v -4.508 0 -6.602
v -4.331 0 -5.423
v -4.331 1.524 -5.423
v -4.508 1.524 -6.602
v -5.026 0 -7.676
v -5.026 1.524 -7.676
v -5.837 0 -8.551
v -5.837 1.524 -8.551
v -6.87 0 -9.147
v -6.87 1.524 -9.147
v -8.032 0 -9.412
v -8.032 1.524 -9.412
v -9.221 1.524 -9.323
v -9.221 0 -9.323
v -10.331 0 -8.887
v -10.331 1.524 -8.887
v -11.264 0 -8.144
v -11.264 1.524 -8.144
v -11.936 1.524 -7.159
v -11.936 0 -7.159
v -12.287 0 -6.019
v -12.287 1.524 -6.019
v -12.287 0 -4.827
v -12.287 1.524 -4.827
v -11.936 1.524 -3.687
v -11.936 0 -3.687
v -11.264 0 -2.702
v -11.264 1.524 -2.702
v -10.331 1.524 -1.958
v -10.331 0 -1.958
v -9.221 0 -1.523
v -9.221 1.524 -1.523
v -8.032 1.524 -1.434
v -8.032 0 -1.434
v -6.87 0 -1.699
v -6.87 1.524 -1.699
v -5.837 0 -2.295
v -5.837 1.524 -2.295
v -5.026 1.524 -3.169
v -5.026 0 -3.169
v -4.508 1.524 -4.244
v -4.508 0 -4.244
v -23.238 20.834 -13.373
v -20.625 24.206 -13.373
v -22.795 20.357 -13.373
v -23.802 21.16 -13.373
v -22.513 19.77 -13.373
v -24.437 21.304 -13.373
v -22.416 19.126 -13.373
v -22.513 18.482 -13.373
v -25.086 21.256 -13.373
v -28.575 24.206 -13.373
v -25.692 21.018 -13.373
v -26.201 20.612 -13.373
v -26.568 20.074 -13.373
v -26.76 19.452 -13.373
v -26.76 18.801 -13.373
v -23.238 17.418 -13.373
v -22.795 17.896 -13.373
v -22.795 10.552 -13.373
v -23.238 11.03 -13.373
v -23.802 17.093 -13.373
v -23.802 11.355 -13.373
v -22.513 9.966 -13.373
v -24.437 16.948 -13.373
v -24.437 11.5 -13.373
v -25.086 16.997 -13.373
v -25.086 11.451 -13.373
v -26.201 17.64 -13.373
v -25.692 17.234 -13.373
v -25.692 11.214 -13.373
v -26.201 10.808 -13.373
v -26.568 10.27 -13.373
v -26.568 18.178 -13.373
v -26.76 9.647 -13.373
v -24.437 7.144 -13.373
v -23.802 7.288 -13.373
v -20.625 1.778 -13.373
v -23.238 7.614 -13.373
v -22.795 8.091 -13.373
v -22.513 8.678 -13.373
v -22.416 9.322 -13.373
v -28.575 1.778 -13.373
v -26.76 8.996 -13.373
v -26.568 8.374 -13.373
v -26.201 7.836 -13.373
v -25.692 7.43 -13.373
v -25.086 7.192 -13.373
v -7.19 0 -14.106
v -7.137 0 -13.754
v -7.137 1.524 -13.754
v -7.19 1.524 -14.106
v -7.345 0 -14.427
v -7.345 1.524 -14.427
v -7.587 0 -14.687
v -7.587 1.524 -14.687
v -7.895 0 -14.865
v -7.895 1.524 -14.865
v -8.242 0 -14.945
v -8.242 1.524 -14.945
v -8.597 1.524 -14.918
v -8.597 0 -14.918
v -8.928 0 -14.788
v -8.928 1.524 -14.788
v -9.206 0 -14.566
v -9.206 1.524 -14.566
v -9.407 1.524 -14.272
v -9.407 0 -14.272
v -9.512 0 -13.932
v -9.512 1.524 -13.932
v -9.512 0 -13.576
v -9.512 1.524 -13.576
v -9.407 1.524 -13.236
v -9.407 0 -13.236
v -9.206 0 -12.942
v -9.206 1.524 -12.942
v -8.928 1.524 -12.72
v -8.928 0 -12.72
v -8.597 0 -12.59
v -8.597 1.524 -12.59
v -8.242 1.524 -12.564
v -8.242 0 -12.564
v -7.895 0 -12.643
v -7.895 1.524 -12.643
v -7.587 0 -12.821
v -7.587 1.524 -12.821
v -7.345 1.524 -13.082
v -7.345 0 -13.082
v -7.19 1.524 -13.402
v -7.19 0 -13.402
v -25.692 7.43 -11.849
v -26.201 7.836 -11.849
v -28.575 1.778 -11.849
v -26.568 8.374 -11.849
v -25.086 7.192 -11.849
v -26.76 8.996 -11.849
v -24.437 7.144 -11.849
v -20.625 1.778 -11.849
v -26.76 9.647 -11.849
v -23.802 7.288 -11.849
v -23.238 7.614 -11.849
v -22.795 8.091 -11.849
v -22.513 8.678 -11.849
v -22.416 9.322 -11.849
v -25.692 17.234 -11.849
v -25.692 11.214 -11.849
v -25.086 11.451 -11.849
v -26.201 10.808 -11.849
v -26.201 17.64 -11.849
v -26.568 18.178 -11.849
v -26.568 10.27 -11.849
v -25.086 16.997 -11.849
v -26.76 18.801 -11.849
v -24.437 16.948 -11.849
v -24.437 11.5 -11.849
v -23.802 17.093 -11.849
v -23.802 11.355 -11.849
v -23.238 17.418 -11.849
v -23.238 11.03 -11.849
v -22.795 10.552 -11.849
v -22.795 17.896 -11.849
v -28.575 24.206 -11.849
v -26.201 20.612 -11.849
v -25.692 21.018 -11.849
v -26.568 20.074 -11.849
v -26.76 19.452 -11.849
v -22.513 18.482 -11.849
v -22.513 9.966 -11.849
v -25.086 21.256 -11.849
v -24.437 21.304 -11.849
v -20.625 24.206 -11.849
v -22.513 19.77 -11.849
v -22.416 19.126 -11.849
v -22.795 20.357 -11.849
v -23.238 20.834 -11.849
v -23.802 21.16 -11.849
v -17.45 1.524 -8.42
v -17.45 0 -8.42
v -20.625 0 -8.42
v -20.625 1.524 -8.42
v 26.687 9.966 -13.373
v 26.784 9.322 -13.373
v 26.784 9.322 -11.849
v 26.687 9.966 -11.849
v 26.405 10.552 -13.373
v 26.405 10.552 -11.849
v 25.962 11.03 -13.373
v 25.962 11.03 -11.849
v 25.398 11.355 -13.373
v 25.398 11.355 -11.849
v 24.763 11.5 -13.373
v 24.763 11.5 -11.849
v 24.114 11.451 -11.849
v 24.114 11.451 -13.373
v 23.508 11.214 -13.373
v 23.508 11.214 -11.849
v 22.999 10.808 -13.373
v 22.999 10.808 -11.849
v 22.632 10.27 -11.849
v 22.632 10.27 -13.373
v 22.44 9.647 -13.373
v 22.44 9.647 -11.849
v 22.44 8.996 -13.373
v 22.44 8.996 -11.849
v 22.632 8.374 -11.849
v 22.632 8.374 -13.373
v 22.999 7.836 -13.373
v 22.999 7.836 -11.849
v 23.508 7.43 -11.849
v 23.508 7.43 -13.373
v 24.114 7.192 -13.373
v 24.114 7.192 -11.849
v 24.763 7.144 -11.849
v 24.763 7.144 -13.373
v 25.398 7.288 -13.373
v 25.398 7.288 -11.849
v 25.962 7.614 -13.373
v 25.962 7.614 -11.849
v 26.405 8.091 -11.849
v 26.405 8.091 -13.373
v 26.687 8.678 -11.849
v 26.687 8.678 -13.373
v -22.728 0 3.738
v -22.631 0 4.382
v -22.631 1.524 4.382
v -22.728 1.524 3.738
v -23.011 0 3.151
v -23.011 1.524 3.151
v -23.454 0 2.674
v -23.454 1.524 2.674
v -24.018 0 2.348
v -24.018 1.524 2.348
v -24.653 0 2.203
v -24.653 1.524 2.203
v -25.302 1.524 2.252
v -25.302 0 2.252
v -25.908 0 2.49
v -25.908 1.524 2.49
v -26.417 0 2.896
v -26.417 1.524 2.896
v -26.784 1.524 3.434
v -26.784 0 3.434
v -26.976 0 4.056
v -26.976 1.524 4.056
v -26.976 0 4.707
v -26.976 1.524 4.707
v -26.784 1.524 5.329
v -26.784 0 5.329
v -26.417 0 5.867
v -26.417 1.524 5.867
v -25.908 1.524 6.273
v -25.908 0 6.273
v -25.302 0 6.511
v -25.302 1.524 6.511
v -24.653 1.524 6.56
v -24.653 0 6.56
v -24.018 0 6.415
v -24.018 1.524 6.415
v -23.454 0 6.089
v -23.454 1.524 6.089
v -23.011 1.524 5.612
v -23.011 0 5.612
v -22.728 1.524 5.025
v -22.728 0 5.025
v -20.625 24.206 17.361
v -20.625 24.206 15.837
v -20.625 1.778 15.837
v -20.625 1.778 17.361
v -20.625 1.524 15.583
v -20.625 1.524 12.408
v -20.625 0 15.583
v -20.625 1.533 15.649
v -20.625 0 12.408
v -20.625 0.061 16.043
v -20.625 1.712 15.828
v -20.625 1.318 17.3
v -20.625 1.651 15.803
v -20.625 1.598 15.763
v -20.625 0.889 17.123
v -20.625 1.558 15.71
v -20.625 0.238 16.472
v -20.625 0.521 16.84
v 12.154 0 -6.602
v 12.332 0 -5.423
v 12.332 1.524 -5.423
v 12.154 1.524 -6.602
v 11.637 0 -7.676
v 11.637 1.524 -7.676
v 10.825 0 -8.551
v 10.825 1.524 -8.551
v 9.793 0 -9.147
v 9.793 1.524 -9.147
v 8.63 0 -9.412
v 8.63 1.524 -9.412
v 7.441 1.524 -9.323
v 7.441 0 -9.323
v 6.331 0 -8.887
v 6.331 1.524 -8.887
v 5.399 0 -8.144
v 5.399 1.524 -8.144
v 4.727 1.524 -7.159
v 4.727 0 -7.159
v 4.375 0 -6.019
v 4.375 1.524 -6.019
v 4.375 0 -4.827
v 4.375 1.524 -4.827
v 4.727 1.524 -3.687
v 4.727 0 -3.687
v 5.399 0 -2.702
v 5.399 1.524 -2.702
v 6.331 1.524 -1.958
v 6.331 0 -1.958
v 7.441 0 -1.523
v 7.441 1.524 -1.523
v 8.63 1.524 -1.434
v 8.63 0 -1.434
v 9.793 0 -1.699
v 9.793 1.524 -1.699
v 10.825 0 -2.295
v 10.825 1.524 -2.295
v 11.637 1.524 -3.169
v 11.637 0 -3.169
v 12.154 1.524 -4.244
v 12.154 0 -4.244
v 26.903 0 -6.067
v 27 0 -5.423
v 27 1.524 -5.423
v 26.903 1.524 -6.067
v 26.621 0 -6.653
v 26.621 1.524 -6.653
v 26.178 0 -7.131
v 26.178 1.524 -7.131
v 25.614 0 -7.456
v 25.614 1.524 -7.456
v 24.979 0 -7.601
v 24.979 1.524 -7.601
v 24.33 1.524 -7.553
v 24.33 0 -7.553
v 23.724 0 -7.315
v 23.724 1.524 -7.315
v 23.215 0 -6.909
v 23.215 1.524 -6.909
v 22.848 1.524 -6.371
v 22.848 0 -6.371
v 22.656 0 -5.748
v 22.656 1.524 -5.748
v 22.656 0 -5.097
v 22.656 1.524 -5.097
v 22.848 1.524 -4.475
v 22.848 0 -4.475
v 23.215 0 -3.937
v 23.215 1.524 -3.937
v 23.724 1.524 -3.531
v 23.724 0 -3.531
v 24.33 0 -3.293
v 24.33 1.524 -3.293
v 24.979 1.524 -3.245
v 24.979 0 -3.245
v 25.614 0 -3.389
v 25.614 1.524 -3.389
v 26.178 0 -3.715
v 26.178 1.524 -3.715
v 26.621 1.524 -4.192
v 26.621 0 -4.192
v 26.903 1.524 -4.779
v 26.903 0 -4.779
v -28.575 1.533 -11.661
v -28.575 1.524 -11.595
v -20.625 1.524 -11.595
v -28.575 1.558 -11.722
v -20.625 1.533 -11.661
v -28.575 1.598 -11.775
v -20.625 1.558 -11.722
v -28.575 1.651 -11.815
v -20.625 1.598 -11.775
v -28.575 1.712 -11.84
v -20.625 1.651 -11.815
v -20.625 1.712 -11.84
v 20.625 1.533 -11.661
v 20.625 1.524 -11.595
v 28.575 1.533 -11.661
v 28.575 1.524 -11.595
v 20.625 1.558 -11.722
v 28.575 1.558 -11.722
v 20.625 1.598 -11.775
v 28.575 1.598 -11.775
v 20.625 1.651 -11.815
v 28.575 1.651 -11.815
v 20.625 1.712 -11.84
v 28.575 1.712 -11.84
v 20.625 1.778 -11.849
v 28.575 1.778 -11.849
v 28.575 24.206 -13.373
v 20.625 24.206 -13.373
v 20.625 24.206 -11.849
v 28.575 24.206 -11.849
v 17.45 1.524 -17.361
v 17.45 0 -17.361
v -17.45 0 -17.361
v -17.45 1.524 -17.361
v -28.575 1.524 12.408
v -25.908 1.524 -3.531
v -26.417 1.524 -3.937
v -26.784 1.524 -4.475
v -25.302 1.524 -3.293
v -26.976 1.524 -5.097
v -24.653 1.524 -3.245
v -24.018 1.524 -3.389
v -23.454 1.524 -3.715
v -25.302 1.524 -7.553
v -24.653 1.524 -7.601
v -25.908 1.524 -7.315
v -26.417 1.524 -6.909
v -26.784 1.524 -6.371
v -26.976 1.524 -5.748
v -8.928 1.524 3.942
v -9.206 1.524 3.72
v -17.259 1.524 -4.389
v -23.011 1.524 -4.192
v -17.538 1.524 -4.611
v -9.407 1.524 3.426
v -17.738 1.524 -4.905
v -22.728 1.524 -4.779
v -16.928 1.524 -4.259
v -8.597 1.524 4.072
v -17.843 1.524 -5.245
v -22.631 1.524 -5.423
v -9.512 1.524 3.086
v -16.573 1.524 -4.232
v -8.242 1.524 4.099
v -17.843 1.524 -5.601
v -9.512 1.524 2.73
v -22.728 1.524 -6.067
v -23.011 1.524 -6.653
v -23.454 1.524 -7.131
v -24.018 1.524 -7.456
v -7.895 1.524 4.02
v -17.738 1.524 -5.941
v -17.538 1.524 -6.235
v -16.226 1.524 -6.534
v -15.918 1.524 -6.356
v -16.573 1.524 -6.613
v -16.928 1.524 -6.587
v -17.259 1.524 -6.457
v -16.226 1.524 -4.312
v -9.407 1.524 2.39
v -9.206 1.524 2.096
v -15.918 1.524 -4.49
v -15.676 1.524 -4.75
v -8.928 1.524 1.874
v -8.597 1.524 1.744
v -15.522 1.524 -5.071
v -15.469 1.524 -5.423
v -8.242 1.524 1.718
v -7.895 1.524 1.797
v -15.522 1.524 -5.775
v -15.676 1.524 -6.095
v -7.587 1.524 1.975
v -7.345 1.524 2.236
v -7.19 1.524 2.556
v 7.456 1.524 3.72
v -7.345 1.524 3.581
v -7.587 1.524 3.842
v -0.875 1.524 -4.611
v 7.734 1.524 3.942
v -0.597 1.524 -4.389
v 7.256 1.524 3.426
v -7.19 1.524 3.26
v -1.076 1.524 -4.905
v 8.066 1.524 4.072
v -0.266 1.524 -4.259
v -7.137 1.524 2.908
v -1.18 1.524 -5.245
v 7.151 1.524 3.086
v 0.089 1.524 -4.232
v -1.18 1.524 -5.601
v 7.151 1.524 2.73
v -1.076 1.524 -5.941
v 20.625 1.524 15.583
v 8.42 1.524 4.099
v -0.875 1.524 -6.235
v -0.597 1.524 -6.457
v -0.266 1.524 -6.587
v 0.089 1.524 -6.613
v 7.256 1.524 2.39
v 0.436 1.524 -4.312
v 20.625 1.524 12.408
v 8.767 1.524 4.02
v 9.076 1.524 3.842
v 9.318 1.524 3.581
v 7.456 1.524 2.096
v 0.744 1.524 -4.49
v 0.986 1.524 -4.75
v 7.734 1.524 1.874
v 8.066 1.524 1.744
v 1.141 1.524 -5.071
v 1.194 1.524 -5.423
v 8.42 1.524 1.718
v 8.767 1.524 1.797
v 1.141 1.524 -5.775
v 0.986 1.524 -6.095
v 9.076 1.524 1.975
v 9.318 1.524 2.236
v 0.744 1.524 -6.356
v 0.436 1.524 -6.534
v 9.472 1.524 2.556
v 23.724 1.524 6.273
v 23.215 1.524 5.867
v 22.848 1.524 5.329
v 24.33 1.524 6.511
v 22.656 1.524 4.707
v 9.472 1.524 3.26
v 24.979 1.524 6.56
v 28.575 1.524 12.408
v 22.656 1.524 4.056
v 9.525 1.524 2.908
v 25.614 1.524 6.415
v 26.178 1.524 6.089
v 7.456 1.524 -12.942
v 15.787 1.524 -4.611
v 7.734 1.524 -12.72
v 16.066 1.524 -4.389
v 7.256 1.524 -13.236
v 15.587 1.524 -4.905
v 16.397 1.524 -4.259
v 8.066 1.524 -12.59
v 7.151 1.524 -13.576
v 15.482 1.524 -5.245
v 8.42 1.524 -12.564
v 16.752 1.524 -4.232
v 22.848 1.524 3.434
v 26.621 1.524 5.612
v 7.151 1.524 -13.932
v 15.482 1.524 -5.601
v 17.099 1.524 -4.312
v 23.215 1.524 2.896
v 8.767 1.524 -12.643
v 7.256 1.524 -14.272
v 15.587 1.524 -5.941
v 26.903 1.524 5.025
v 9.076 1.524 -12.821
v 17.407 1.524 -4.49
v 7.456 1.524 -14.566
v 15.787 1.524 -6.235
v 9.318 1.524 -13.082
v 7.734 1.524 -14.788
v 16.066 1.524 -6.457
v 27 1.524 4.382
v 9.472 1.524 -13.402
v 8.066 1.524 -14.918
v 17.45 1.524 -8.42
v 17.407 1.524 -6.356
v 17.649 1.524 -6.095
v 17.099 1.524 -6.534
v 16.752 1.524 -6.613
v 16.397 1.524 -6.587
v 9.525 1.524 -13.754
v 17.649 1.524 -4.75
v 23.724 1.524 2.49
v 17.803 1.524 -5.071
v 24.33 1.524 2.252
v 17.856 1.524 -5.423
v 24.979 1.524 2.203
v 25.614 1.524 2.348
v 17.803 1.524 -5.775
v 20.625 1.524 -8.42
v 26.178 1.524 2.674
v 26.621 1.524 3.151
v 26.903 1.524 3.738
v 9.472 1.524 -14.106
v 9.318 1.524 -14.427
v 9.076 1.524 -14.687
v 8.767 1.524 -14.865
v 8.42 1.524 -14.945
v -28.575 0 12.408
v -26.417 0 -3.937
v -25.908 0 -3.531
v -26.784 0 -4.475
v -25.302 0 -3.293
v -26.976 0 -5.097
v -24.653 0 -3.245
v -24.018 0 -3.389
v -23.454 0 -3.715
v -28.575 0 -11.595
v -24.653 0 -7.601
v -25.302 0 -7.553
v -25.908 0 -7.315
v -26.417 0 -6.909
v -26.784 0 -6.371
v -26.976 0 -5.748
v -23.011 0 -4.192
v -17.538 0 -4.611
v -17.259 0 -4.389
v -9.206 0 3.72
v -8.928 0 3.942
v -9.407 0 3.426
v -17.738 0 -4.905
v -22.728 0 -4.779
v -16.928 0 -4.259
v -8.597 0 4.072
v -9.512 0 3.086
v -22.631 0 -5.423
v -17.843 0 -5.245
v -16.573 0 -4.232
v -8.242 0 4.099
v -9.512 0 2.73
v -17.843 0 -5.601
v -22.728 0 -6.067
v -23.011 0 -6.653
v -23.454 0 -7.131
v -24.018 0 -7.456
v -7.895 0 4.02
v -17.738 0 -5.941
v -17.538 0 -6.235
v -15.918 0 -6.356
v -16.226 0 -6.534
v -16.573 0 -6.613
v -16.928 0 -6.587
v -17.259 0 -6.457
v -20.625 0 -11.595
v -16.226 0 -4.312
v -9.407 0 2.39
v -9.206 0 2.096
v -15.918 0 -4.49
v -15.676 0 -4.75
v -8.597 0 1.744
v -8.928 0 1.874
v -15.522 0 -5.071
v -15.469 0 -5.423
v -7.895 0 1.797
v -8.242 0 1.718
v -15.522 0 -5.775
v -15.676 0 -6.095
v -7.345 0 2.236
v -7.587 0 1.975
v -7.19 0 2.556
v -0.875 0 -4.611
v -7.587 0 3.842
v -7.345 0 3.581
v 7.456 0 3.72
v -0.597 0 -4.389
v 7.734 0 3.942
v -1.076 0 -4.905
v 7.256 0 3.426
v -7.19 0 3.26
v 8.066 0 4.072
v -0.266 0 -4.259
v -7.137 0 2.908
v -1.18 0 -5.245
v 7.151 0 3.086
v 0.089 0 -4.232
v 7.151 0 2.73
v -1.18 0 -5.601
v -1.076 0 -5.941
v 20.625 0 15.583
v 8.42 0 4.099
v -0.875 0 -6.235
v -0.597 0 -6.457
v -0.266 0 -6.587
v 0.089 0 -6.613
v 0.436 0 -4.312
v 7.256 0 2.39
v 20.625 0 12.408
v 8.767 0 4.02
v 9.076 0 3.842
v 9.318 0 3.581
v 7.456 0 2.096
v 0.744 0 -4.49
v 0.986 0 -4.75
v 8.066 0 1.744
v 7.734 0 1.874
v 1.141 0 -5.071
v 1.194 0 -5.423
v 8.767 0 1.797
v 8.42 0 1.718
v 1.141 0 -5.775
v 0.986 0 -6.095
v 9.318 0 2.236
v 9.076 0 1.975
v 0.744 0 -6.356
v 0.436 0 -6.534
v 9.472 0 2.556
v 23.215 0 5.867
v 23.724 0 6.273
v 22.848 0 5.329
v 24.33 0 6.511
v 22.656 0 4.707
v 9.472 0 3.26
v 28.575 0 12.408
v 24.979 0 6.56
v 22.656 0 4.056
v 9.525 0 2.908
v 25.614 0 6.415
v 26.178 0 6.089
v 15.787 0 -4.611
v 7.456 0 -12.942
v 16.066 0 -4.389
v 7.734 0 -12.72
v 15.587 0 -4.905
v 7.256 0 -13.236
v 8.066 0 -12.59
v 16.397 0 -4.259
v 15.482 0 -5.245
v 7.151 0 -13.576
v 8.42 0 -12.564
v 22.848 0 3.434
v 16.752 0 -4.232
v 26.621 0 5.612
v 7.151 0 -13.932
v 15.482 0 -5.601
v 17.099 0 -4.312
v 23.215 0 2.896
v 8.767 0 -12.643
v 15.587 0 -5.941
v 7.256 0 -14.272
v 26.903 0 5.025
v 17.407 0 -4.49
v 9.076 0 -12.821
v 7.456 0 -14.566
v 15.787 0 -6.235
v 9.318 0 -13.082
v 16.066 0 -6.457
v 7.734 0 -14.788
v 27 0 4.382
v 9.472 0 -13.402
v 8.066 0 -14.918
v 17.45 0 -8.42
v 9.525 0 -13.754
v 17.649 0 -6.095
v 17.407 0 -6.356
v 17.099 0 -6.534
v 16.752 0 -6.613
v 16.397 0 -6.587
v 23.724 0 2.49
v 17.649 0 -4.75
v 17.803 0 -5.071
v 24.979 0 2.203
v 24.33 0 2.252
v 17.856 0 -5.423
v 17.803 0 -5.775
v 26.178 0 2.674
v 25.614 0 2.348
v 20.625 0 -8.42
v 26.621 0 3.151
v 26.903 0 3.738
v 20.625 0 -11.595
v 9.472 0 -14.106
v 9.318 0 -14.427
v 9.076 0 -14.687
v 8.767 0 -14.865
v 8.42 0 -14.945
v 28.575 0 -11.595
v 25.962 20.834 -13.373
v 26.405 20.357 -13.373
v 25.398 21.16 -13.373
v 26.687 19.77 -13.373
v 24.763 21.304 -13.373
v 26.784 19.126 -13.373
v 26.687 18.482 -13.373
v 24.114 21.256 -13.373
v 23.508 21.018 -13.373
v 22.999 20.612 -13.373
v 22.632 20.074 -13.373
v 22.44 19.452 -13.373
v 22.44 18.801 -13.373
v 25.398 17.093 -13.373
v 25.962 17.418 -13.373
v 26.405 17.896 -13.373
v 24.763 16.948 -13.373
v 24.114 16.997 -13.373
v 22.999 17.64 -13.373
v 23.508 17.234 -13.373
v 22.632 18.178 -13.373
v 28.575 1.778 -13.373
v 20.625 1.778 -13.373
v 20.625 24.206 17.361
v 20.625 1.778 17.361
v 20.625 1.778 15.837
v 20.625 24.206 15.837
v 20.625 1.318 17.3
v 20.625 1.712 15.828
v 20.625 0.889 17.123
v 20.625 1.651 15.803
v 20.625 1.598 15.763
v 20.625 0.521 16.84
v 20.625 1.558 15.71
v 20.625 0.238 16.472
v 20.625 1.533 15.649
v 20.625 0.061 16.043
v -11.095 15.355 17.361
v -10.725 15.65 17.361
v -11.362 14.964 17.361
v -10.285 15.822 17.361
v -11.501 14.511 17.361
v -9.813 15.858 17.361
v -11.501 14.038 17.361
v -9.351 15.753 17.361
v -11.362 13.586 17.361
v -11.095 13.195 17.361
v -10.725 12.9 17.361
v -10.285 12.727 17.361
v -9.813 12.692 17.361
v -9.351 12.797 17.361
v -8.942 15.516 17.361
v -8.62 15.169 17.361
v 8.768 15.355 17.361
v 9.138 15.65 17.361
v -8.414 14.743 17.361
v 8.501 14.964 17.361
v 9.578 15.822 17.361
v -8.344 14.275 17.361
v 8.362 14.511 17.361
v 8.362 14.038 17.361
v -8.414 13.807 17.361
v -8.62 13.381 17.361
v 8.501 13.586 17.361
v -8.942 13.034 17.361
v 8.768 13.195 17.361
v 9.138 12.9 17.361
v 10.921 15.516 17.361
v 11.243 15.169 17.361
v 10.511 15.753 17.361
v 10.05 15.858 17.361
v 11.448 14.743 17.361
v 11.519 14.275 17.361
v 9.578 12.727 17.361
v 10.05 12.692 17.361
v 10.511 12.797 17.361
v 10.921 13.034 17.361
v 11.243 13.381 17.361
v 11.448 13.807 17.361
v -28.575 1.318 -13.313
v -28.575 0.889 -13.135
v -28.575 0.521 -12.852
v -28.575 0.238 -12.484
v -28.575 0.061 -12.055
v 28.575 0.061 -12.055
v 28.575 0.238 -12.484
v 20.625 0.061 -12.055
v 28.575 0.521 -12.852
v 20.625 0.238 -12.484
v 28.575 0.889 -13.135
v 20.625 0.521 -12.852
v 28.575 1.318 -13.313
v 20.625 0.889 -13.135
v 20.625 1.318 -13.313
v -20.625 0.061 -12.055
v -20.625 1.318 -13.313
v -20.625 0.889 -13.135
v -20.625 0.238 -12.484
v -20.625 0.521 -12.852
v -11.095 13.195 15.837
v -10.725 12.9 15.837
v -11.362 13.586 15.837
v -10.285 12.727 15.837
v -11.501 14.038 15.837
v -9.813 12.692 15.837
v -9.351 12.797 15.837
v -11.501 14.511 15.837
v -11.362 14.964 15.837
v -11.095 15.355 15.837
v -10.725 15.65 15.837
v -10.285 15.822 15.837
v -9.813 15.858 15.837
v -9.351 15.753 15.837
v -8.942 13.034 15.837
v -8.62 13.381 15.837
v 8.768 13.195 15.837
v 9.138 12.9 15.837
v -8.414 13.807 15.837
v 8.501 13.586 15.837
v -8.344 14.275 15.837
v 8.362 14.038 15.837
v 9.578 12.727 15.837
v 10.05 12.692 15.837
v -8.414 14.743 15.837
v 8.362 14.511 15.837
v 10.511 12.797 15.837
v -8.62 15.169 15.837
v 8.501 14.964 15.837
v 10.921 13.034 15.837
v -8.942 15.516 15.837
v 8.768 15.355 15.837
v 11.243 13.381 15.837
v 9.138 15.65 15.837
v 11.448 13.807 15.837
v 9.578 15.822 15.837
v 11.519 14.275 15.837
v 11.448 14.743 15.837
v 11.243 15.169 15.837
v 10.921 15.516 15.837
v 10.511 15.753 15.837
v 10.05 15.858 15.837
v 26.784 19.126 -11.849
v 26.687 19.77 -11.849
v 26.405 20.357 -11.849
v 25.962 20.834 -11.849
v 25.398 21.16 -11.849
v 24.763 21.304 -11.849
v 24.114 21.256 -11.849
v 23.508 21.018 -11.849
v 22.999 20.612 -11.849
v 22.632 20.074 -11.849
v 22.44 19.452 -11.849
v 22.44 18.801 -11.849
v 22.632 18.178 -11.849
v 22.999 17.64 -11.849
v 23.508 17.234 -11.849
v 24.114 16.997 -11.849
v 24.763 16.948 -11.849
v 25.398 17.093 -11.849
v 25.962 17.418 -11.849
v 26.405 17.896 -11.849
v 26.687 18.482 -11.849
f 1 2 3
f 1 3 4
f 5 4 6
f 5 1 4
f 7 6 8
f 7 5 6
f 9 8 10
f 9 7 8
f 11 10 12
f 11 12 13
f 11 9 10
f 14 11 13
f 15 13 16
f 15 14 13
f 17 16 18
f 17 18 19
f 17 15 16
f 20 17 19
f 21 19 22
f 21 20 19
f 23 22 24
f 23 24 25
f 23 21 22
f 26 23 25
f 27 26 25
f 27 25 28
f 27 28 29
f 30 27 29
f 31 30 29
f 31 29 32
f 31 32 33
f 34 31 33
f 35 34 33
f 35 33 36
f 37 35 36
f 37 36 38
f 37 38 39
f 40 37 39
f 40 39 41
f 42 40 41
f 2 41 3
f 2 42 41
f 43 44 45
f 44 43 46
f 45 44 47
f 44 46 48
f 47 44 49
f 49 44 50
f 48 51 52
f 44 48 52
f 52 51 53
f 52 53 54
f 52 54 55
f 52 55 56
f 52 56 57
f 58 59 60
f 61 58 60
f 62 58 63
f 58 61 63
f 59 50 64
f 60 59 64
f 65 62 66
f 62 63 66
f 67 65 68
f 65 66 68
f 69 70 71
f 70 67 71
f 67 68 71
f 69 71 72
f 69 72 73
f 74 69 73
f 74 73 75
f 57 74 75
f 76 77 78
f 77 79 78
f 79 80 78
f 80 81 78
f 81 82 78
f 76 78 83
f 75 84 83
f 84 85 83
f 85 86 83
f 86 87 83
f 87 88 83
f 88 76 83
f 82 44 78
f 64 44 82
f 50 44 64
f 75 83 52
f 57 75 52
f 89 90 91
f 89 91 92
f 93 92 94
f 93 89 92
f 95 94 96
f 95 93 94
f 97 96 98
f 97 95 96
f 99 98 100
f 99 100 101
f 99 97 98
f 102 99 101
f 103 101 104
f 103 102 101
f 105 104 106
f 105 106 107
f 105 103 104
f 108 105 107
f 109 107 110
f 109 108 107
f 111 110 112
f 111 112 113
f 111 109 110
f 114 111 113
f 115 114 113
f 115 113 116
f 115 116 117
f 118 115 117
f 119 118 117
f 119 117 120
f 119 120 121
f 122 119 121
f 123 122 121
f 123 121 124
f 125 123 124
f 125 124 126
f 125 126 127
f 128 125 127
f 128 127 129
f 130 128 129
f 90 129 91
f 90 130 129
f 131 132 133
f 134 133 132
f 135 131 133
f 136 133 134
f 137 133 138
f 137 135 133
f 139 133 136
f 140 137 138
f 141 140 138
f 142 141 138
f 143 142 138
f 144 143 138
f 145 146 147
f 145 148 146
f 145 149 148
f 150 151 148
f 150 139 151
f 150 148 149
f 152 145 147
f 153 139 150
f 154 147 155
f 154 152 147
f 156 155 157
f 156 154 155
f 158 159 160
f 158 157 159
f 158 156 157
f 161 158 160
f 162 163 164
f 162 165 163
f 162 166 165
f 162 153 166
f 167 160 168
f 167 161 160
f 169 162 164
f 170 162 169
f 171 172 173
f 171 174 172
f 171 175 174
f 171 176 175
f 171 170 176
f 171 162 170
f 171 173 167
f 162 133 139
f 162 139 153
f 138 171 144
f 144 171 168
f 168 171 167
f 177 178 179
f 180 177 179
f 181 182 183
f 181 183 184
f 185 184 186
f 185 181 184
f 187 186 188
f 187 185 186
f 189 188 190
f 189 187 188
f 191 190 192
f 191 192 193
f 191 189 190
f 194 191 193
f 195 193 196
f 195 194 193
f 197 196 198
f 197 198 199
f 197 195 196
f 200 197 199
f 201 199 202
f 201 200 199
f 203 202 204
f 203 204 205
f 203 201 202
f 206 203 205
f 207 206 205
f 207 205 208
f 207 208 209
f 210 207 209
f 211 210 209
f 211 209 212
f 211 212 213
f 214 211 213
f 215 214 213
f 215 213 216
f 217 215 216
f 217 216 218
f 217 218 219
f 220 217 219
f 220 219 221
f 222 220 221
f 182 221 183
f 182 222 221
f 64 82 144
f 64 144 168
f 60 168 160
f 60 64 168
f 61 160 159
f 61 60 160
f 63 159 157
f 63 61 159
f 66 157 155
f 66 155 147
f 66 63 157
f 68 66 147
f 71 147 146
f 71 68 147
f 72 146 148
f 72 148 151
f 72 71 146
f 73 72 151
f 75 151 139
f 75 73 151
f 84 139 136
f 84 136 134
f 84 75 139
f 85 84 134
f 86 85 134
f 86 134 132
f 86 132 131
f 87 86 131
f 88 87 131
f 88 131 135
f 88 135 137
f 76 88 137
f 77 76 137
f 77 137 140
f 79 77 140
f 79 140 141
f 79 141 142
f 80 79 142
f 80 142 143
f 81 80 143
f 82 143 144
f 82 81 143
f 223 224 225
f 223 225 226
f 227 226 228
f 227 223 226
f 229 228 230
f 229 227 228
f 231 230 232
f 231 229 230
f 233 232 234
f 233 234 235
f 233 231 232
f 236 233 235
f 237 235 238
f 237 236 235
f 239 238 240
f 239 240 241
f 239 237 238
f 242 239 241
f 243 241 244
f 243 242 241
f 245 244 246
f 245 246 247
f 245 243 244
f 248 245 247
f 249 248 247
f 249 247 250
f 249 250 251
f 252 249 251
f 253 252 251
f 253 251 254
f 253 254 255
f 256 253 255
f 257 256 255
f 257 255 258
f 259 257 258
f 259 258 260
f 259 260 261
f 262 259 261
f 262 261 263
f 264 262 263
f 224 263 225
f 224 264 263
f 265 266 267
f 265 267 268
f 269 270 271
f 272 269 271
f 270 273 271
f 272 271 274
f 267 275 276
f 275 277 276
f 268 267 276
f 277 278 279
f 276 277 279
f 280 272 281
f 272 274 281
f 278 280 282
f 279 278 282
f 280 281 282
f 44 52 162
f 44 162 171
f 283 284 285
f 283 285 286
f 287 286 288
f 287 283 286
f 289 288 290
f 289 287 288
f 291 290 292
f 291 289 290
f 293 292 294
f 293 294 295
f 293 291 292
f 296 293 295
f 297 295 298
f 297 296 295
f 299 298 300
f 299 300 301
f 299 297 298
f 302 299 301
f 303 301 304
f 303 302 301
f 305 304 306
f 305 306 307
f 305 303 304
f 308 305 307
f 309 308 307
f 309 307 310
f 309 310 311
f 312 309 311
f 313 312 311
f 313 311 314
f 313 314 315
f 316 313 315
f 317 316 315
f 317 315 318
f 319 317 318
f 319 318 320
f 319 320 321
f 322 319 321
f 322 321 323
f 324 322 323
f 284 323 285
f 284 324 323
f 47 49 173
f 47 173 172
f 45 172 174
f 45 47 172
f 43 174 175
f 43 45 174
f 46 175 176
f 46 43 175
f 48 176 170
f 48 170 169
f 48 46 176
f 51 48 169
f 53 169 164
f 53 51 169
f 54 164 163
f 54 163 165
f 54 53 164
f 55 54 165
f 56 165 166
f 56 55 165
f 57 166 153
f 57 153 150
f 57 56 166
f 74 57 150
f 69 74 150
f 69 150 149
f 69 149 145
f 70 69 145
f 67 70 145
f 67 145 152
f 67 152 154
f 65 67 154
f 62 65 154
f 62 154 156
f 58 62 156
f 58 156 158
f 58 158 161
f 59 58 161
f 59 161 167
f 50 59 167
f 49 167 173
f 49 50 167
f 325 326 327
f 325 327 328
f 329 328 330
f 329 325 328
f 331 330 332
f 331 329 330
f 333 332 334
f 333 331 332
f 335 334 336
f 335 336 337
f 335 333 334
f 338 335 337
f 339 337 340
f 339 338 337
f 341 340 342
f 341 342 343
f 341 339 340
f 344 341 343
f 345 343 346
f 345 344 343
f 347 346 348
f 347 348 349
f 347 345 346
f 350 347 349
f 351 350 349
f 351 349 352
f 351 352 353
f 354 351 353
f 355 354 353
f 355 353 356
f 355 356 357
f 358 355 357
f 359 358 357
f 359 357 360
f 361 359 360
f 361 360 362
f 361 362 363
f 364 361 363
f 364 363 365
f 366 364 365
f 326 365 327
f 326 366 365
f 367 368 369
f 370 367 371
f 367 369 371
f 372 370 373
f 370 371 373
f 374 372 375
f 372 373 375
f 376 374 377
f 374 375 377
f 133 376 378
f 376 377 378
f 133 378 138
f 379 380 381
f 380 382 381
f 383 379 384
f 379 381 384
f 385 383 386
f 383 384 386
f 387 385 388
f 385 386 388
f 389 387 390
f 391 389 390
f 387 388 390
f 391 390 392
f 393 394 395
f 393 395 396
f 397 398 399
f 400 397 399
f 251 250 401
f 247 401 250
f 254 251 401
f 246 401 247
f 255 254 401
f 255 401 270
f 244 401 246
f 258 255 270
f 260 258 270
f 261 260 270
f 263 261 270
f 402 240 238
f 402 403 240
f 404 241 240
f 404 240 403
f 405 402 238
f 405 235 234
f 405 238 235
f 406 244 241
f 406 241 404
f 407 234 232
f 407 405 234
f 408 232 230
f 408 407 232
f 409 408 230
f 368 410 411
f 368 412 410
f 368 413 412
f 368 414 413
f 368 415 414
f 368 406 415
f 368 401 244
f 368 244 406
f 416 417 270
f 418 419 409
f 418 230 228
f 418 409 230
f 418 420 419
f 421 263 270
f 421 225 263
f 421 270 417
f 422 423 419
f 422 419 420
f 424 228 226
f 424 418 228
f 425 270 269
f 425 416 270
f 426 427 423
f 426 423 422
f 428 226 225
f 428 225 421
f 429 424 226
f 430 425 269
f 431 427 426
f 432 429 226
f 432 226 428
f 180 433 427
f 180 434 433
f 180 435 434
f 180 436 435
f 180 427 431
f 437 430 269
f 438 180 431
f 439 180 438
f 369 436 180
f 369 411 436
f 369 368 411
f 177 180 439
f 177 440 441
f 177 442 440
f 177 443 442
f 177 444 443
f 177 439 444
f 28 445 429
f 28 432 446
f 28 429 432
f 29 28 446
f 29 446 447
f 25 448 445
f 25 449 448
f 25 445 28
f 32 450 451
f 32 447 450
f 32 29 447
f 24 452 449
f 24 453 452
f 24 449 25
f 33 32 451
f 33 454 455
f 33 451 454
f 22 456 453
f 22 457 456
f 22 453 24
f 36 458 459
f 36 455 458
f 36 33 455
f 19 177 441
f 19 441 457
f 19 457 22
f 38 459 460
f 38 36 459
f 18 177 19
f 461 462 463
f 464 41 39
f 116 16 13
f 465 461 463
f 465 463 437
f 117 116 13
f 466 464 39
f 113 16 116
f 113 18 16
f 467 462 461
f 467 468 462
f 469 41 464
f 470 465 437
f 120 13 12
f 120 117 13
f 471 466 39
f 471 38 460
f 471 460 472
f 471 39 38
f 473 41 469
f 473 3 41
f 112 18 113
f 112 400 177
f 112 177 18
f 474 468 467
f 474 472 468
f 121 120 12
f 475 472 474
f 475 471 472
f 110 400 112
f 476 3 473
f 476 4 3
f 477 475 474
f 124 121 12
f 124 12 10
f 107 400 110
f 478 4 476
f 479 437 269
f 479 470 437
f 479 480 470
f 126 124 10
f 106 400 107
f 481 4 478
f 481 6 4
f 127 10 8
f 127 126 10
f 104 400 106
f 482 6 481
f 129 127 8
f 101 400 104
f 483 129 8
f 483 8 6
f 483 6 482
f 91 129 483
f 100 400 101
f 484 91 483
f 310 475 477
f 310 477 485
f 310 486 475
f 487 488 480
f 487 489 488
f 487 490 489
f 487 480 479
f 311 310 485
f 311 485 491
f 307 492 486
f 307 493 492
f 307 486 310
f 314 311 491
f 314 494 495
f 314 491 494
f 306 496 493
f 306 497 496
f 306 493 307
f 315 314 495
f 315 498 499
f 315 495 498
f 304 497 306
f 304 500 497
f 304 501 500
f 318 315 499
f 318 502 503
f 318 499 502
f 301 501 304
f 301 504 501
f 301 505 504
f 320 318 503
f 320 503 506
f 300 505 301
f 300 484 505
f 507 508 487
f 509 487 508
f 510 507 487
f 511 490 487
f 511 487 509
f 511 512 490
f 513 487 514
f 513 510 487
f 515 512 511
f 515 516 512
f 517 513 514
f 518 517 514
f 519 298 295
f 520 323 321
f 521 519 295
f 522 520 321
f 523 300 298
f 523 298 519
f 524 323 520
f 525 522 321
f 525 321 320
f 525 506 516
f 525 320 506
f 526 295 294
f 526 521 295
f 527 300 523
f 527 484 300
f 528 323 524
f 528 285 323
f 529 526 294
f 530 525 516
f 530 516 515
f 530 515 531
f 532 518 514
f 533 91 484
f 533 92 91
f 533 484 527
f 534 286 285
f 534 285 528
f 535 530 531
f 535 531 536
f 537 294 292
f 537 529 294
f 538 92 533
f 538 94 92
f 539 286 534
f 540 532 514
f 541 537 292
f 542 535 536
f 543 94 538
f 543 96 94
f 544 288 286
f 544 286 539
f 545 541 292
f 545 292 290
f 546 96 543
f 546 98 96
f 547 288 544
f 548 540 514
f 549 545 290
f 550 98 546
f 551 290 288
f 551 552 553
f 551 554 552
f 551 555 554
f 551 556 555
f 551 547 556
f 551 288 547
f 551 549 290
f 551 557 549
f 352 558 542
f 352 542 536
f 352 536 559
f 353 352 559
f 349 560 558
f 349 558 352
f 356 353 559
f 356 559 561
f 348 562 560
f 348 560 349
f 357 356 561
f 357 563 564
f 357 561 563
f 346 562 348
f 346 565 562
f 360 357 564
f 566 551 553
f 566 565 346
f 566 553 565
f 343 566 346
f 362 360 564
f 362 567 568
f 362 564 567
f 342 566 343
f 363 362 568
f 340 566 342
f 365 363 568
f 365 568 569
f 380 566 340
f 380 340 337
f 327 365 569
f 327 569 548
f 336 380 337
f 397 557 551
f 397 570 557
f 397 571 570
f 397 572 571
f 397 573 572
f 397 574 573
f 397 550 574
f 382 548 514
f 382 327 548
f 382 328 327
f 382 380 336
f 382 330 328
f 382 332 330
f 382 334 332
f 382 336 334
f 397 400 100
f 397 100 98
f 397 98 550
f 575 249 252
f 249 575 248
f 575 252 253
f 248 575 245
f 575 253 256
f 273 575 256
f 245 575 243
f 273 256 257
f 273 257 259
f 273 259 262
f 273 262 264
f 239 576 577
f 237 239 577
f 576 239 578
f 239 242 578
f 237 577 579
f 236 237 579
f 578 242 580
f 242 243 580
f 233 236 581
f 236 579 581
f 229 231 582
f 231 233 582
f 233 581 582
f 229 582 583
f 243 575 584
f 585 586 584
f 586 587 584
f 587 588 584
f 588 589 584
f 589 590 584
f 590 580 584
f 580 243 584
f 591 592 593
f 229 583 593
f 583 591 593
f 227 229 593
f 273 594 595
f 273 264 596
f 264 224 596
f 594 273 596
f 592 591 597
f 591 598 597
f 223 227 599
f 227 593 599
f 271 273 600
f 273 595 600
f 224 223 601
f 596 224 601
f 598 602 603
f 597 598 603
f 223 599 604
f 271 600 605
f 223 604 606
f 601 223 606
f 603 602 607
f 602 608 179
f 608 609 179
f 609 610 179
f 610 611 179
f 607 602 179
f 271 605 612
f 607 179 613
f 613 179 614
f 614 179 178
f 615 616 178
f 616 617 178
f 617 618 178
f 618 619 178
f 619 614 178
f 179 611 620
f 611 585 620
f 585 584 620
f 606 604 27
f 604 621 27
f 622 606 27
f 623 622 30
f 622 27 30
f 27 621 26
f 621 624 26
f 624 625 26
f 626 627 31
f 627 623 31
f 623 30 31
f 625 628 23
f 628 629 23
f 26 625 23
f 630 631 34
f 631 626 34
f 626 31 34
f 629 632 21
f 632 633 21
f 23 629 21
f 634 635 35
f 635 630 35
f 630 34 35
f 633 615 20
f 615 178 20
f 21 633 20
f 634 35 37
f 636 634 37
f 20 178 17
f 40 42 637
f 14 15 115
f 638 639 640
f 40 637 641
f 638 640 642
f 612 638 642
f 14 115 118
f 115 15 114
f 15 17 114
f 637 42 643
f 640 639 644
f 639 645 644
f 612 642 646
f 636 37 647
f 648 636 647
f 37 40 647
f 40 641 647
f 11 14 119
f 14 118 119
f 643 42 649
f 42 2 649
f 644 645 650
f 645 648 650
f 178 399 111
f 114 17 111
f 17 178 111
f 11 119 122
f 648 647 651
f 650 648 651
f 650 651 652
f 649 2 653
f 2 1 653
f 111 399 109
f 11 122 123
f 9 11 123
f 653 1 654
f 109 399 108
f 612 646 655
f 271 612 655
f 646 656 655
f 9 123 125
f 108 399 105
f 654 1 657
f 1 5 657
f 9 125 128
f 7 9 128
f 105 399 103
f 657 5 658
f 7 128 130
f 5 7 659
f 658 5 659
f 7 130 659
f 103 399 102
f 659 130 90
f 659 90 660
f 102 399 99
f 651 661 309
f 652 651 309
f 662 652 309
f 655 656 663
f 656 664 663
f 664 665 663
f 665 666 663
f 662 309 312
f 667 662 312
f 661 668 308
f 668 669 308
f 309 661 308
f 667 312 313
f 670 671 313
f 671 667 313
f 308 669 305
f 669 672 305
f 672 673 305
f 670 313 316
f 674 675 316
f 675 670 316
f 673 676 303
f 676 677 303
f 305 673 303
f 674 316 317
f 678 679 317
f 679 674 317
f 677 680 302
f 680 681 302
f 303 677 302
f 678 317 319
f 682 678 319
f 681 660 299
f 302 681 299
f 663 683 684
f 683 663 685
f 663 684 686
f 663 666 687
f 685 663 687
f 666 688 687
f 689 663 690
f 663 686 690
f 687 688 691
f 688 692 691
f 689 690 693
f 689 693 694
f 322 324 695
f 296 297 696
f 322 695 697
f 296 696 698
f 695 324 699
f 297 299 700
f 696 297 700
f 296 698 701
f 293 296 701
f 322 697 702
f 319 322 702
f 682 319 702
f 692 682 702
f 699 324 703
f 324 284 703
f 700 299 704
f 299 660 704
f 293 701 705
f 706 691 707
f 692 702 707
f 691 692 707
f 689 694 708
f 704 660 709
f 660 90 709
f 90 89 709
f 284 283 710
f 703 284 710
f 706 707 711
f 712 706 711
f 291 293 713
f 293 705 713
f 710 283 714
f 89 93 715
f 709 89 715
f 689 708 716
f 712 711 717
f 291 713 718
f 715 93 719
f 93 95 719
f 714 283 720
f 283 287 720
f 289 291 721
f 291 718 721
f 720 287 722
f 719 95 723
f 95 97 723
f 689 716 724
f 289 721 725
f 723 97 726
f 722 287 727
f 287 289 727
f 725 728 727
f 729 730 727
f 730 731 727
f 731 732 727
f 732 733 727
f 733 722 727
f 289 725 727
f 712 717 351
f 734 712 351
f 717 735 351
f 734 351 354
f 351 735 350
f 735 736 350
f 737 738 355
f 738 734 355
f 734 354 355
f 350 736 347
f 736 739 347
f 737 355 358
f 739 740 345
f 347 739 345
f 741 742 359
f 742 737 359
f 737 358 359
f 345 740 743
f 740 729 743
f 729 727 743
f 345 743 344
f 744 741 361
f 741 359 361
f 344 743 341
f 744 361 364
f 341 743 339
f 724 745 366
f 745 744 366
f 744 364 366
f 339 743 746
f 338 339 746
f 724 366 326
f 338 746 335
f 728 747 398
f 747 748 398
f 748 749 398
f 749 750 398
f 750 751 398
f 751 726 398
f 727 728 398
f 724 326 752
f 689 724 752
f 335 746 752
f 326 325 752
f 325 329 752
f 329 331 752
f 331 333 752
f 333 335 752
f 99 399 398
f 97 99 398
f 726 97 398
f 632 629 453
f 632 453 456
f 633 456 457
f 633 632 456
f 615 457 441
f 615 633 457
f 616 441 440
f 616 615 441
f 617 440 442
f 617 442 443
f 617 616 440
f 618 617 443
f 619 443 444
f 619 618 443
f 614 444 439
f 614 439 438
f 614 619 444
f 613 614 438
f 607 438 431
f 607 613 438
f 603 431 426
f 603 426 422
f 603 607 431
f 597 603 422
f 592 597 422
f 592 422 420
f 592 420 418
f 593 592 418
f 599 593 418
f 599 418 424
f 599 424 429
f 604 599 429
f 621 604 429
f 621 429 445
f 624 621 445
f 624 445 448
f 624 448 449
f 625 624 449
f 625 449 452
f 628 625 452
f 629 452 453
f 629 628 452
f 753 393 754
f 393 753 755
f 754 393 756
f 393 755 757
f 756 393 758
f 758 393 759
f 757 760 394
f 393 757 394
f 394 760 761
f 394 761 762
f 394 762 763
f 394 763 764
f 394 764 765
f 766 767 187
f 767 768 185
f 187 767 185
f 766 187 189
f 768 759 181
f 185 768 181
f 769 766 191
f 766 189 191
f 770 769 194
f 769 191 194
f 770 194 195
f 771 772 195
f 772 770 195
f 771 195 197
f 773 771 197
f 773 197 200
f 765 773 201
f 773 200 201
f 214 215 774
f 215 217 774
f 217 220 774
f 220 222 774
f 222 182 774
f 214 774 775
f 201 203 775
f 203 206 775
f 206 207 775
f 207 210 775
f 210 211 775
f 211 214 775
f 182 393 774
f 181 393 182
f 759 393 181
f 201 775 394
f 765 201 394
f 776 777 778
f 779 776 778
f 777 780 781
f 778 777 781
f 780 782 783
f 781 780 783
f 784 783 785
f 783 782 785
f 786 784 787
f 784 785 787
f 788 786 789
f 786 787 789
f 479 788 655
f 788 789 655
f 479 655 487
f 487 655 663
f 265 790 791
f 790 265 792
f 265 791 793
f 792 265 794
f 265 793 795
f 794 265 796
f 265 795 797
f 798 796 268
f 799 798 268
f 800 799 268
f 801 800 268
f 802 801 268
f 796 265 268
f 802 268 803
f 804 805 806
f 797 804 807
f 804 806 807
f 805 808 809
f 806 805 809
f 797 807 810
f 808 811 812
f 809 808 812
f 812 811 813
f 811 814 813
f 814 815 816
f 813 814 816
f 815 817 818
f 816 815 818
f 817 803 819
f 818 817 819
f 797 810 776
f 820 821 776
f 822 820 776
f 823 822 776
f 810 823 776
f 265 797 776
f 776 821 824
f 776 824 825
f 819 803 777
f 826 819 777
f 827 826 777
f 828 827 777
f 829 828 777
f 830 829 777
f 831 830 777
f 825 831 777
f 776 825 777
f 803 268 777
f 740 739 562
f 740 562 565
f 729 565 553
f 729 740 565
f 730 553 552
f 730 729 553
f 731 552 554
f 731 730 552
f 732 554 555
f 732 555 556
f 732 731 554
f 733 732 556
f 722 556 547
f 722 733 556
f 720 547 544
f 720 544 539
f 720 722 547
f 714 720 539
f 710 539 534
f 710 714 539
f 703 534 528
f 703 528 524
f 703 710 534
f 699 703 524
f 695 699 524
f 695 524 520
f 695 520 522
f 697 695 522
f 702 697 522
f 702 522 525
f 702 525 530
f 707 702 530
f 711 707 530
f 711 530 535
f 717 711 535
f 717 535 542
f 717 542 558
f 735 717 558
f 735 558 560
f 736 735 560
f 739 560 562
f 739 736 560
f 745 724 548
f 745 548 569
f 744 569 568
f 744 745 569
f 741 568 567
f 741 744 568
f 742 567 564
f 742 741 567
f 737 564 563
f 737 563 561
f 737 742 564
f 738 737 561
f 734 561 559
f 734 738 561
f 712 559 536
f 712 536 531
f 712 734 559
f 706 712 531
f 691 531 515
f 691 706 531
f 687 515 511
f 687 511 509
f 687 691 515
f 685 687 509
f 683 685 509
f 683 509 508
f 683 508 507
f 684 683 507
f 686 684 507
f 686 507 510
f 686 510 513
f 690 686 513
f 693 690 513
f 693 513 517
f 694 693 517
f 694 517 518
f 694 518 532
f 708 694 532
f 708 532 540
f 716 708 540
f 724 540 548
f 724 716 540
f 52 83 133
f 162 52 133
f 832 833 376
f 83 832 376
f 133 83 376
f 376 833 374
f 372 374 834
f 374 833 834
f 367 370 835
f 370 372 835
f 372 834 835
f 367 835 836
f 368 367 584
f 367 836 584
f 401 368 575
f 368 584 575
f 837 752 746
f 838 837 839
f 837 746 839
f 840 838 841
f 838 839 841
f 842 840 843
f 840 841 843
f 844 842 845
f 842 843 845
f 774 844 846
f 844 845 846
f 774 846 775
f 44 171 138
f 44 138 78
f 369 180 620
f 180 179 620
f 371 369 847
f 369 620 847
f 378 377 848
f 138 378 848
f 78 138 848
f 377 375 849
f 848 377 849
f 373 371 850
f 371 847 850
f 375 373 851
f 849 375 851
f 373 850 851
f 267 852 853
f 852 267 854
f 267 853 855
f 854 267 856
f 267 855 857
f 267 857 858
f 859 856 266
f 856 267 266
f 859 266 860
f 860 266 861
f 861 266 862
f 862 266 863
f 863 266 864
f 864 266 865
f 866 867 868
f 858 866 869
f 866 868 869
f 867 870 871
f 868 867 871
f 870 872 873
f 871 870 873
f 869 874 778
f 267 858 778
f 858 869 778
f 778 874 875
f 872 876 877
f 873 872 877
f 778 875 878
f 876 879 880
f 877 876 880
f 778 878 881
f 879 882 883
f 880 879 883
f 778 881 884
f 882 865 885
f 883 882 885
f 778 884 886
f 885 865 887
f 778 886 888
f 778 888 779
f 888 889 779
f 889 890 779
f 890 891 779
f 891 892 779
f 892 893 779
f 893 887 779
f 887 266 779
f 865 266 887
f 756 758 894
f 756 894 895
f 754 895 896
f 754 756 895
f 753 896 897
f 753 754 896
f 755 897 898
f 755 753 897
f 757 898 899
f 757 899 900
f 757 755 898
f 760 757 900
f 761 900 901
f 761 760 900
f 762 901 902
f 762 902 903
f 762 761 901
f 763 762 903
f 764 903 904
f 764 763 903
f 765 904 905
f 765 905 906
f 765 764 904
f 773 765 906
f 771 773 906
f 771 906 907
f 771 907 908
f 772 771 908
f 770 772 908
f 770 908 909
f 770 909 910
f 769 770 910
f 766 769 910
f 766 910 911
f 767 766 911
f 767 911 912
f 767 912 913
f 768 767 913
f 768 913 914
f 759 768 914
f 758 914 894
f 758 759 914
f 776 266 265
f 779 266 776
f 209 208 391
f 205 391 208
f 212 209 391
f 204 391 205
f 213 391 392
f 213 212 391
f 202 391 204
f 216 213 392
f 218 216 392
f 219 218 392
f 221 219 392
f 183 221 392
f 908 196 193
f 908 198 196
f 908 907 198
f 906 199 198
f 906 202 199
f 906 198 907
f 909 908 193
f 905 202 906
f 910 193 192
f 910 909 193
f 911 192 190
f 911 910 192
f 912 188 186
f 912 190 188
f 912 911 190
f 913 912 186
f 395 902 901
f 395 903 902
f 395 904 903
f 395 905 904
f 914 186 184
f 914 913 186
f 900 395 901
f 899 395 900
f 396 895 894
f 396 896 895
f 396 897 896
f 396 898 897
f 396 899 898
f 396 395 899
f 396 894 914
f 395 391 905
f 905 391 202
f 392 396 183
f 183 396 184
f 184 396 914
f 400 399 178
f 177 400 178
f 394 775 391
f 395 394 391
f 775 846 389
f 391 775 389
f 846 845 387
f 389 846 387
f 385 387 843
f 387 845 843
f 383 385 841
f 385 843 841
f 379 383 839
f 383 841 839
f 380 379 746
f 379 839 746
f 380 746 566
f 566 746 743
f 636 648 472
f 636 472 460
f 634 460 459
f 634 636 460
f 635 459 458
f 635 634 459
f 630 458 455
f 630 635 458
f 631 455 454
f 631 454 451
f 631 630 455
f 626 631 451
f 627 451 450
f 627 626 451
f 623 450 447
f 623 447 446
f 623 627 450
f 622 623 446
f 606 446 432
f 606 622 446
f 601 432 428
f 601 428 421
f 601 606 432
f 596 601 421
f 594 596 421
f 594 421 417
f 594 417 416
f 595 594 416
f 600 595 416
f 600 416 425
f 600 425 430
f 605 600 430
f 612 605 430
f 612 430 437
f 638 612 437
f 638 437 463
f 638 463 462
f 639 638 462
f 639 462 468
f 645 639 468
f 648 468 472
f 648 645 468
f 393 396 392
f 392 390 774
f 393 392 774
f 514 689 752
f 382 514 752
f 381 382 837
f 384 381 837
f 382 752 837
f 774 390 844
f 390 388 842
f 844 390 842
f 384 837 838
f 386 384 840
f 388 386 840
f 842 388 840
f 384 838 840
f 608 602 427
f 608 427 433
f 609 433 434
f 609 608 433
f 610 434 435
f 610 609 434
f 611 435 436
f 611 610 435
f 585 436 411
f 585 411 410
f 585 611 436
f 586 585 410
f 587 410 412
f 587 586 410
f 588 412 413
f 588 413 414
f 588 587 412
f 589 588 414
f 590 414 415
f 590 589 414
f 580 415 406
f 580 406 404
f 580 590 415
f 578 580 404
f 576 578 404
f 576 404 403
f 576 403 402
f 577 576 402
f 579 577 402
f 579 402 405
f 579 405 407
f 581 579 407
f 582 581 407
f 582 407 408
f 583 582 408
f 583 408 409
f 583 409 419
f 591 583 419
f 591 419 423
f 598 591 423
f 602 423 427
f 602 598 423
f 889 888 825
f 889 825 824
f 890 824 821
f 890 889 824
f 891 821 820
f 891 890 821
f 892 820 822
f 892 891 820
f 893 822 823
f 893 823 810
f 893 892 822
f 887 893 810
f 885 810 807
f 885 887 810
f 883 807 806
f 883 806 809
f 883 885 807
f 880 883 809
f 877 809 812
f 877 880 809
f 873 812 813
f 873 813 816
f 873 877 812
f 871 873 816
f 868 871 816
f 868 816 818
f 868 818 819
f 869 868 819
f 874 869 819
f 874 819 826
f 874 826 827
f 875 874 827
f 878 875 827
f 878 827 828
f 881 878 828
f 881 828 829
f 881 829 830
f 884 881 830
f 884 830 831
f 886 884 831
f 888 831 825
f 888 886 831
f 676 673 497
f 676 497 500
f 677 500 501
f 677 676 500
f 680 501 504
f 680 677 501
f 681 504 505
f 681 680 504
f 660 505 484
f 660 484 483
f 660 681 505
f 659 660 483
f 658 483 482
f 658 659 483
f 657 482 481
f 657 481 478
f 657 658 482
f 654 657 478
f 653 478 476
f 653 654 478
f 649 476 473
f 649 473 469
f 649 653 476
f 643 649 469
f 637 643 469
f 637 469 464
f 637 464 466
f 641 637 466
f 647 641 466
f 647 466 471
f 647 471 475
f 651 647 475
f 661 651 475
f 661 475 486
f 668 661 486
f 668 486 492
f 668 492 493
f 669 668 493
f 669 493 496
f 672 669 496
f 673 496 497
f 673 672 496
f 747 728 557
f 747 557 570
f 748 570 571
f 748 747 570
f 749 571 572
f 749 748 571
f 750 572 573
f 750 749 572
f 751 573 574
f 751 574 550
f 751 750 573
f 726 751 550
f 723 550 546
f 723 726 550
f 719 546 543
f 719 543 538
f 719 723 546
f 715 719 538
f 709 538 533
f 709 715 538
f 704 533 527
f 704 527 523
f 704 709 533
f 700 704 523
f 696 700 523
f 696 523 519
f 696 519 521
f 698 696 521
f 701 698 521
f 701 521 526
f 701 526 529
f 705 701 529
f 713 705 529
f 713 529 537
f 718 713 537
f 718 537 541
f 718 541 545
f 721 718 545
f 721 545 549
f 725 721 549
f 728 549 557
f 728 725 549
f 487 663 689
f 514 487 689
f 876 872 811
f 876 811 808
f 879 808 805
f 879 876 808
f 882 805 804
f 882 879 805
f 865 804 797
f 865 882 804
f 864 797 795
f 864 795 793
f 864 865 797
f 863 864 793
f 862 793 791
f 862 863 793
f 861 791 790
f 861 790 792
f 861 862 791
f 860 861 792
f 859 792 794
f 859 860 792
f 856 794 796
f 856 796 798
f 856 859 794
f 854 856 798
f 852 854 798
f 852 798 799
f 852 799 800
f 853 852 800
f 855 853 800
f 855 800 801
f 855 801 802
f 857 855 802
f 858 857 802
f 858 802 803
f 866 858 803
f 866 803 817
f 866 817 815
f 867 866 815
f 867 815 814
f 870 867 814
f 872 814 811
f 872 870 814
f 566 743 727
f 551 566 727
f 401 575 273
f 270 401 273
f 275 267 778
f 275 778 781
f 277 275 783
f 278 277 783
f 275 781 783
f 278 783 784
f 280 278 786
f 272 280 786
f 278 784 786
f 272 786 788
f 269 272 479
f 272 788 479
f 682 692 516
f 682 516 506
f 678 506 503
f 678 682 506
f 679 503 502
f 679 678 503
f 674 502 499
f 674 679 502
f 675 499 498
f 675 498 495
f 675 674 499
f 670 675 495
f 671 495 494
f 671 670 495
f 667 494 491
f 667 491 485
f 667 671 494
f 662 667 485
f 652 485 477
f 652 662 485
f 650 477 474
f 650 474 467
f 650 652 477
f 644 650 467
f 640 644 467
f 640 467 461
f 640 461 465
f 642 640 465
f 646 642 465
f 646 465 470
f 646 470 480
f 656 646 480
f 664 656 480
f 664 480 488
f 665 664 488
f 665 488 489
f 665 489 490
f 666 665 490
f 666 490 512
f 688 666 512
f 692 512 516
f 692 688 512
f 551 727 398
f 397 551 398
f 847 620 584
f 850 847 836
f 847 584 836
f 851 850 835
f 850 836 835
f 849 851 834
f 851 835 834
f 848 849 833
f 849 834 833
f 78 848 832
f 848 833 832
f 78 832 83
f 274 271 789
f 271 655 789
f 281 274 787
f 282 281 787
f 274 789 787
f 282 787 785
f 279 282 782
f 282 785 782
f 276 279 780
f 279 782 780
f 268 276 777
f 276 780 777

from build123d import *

# Parameters (mm, degrees)
SKETCH1_R      = 2.1844
SKETCH1_R_2    = 1.1938
SKETCH1_R_3    = 4.0005
EXTRUDE1_DEPTH = 1.524
EXTRUDE3_START = -13.3731
SKETCH3_W      = 7.9502
SKETCH3_H      = 24.2062
SKETCH3_R      = 2.1844
EXTRUDE3_DEPTH = 1.524
EXTRUDE4_START = 15.8369
SKETCH3_3_W    = 41.2496
SKETCH3_3_H    = 24.2062
SKETCH3_3_R    = 1.5875
EXTRUDE4_DEPTH = 1.524
FILLET4_R      = 1.778
FILLET5_R      = 0.254


with BuildPart() as part:
    # Sketch1 → Extrude1 (new body)
    with BuildSketch(Plane(origin=(0, 0, 0), x_dir=(1, 0, 0), z_dir=(0, 1, 0))):
        Polygon((28.575, -12.4079), (28.575, 13.3731), (20.6248, 13.3731), (20.6248, 8.4201), (17.4498, 8.4201), (17.4498, 17.3609), (-17.4498, 17.3609), (-17.4498, 8.4201), (-20.6248, 8.4201), (-20.6248, 13.3731), (-28.575, 13.3731), (-28.575, -12.4079), (-20.6248, -12.4079), (-20.6248, -17.3609), (20.6248, -17.3609), (20.6248, -12.4079), align=None)
        with Locations((-24.8158, -4.3815)):
            Circle(SKETCH1_R, mode=Mode.SUBTRACT)
        with Locations((-8.3312, -2.9083)):
            Circle(SKETCH1_R_2, mode=Mode.SUBTRACT)
        with Locations((8.3312, -2.9083)):
            Circle(SKETCH1_R_2, mode=Mode.SUBTRACT)
        with Locations((24.8158, -4.3815)):
            Circle(SKETCH1_R, mode=Mode.SUBTRACT)
        with Locations((8.3312, 13.7541)):
            Circle(SKETCH1_R_2, mode=Mode.SUBTRACT)
        with Locations((-24.8158, 5.4229)):
            Circle(SKETCH1_R, mode=Mode.SUBTRACT)
        with Locations((-16.6624, 5.4229)):
            Circle(SKETCH1_R_2, mode=Mode.SUBTRACT)
        with Locations((-8.3312, 5.4229)):
            Circle(SKETCH1_R_3, mode=Mode.SUBTRACT)
        with Locations((-8.3312, 13.7541)):
            Circle(SKETCH1_R_2, mode=Mode.SUBTRACT)
        with Locations((0, 5.4229)):
            Circle(SKETCH1_R_2, mode=Mode.SUBTRACT)
        with Locations((8.3312, 5.4229)):
            Circle(SKETCH1_R_3, mode=Mode.SUBTRACT)
        with Locations((16.6624, 5.4229)):
            Circle(SKETCH1_R_2, mode=Mode.SUBTRACT)
        with Locations((24.8158, 5.4229)):
            Circle(SKETCH1_R, mode=Mode.SUBTRACT)
    extrude(amount=EXTRUDE1_DEPTH)

    # Sketch3 → Extrude3 (add)
    with BuildSketch(Plane.XY.offset(EXTRUDE3_START)):
        with Locations((-24.5999, 12.1031)):
            Rectangle(SKETCH3_W, SKETCH3_H)
        with Locations((-24.5999, 19.1262)):
            Circle(SKETCH3_R, mode=Mode.SUBTRACT)
        with Locations((-24.5999, 9.3218)):
            Circle(SKETCH3_R, mode=Mode.SUBTRACT)
        with Locations((24.5999, 12.1031)):
            Rectangle(SKETCH3_W, SKETCH3_H)
        with Locations((24.5999, 9.3218)):
            Circle(SKETCH3_R, mode=Mode.SUBTRACT)
        with Locations((24.5999, 19.1262)):
            Circle(SKETCH3_R, mode=Mode.SUBTRACT)
    extrude(amount=EXTRUDE3_DEPTH)

    # Sketch3_3 → Extrude4 (add)
    with BuildSketch(Plane.XY.offset(EXTRUDE4_START)):
        with Locations((0, 12.1031)):
            Rectangle(SKETCH3_3_W, SKETCH3_3_H)
        with Locations((-9.9314, 14.2748)):
            Circle(SKETCH3_3_R, mode=Mode.SUBTRACT)
        with Locations((9.9314, 14.2748)):
            Circle(SKETCH3_3_R, mode=Mode.SUBTRACT)
    extrude(amount=EXTRUDE4_DEPTH)

    # Fillet4
    fillet4_edges = [part.edges().sort_by_distance(p)[0] for p in [
        (0, 0, 17.3609),
        (-24.5999, 0, -13.3731),
        (24.5999, 0, -13.3731),
    ]]
    fillet(fillet4_edges, radius=FILLET4_R)

    # Fillet5
    fillet5_edges = [part.edges().sort_by_distance(p)[0] for p in [
        (24.5999, 1.524, -11.8491),
        (0, 1.524, 15.8369),
        (-24.5999, 1.524, -11.8491),
    ]]
    fillet(fillet5_edges, radius=FILLET5_R)


solid = part.part
